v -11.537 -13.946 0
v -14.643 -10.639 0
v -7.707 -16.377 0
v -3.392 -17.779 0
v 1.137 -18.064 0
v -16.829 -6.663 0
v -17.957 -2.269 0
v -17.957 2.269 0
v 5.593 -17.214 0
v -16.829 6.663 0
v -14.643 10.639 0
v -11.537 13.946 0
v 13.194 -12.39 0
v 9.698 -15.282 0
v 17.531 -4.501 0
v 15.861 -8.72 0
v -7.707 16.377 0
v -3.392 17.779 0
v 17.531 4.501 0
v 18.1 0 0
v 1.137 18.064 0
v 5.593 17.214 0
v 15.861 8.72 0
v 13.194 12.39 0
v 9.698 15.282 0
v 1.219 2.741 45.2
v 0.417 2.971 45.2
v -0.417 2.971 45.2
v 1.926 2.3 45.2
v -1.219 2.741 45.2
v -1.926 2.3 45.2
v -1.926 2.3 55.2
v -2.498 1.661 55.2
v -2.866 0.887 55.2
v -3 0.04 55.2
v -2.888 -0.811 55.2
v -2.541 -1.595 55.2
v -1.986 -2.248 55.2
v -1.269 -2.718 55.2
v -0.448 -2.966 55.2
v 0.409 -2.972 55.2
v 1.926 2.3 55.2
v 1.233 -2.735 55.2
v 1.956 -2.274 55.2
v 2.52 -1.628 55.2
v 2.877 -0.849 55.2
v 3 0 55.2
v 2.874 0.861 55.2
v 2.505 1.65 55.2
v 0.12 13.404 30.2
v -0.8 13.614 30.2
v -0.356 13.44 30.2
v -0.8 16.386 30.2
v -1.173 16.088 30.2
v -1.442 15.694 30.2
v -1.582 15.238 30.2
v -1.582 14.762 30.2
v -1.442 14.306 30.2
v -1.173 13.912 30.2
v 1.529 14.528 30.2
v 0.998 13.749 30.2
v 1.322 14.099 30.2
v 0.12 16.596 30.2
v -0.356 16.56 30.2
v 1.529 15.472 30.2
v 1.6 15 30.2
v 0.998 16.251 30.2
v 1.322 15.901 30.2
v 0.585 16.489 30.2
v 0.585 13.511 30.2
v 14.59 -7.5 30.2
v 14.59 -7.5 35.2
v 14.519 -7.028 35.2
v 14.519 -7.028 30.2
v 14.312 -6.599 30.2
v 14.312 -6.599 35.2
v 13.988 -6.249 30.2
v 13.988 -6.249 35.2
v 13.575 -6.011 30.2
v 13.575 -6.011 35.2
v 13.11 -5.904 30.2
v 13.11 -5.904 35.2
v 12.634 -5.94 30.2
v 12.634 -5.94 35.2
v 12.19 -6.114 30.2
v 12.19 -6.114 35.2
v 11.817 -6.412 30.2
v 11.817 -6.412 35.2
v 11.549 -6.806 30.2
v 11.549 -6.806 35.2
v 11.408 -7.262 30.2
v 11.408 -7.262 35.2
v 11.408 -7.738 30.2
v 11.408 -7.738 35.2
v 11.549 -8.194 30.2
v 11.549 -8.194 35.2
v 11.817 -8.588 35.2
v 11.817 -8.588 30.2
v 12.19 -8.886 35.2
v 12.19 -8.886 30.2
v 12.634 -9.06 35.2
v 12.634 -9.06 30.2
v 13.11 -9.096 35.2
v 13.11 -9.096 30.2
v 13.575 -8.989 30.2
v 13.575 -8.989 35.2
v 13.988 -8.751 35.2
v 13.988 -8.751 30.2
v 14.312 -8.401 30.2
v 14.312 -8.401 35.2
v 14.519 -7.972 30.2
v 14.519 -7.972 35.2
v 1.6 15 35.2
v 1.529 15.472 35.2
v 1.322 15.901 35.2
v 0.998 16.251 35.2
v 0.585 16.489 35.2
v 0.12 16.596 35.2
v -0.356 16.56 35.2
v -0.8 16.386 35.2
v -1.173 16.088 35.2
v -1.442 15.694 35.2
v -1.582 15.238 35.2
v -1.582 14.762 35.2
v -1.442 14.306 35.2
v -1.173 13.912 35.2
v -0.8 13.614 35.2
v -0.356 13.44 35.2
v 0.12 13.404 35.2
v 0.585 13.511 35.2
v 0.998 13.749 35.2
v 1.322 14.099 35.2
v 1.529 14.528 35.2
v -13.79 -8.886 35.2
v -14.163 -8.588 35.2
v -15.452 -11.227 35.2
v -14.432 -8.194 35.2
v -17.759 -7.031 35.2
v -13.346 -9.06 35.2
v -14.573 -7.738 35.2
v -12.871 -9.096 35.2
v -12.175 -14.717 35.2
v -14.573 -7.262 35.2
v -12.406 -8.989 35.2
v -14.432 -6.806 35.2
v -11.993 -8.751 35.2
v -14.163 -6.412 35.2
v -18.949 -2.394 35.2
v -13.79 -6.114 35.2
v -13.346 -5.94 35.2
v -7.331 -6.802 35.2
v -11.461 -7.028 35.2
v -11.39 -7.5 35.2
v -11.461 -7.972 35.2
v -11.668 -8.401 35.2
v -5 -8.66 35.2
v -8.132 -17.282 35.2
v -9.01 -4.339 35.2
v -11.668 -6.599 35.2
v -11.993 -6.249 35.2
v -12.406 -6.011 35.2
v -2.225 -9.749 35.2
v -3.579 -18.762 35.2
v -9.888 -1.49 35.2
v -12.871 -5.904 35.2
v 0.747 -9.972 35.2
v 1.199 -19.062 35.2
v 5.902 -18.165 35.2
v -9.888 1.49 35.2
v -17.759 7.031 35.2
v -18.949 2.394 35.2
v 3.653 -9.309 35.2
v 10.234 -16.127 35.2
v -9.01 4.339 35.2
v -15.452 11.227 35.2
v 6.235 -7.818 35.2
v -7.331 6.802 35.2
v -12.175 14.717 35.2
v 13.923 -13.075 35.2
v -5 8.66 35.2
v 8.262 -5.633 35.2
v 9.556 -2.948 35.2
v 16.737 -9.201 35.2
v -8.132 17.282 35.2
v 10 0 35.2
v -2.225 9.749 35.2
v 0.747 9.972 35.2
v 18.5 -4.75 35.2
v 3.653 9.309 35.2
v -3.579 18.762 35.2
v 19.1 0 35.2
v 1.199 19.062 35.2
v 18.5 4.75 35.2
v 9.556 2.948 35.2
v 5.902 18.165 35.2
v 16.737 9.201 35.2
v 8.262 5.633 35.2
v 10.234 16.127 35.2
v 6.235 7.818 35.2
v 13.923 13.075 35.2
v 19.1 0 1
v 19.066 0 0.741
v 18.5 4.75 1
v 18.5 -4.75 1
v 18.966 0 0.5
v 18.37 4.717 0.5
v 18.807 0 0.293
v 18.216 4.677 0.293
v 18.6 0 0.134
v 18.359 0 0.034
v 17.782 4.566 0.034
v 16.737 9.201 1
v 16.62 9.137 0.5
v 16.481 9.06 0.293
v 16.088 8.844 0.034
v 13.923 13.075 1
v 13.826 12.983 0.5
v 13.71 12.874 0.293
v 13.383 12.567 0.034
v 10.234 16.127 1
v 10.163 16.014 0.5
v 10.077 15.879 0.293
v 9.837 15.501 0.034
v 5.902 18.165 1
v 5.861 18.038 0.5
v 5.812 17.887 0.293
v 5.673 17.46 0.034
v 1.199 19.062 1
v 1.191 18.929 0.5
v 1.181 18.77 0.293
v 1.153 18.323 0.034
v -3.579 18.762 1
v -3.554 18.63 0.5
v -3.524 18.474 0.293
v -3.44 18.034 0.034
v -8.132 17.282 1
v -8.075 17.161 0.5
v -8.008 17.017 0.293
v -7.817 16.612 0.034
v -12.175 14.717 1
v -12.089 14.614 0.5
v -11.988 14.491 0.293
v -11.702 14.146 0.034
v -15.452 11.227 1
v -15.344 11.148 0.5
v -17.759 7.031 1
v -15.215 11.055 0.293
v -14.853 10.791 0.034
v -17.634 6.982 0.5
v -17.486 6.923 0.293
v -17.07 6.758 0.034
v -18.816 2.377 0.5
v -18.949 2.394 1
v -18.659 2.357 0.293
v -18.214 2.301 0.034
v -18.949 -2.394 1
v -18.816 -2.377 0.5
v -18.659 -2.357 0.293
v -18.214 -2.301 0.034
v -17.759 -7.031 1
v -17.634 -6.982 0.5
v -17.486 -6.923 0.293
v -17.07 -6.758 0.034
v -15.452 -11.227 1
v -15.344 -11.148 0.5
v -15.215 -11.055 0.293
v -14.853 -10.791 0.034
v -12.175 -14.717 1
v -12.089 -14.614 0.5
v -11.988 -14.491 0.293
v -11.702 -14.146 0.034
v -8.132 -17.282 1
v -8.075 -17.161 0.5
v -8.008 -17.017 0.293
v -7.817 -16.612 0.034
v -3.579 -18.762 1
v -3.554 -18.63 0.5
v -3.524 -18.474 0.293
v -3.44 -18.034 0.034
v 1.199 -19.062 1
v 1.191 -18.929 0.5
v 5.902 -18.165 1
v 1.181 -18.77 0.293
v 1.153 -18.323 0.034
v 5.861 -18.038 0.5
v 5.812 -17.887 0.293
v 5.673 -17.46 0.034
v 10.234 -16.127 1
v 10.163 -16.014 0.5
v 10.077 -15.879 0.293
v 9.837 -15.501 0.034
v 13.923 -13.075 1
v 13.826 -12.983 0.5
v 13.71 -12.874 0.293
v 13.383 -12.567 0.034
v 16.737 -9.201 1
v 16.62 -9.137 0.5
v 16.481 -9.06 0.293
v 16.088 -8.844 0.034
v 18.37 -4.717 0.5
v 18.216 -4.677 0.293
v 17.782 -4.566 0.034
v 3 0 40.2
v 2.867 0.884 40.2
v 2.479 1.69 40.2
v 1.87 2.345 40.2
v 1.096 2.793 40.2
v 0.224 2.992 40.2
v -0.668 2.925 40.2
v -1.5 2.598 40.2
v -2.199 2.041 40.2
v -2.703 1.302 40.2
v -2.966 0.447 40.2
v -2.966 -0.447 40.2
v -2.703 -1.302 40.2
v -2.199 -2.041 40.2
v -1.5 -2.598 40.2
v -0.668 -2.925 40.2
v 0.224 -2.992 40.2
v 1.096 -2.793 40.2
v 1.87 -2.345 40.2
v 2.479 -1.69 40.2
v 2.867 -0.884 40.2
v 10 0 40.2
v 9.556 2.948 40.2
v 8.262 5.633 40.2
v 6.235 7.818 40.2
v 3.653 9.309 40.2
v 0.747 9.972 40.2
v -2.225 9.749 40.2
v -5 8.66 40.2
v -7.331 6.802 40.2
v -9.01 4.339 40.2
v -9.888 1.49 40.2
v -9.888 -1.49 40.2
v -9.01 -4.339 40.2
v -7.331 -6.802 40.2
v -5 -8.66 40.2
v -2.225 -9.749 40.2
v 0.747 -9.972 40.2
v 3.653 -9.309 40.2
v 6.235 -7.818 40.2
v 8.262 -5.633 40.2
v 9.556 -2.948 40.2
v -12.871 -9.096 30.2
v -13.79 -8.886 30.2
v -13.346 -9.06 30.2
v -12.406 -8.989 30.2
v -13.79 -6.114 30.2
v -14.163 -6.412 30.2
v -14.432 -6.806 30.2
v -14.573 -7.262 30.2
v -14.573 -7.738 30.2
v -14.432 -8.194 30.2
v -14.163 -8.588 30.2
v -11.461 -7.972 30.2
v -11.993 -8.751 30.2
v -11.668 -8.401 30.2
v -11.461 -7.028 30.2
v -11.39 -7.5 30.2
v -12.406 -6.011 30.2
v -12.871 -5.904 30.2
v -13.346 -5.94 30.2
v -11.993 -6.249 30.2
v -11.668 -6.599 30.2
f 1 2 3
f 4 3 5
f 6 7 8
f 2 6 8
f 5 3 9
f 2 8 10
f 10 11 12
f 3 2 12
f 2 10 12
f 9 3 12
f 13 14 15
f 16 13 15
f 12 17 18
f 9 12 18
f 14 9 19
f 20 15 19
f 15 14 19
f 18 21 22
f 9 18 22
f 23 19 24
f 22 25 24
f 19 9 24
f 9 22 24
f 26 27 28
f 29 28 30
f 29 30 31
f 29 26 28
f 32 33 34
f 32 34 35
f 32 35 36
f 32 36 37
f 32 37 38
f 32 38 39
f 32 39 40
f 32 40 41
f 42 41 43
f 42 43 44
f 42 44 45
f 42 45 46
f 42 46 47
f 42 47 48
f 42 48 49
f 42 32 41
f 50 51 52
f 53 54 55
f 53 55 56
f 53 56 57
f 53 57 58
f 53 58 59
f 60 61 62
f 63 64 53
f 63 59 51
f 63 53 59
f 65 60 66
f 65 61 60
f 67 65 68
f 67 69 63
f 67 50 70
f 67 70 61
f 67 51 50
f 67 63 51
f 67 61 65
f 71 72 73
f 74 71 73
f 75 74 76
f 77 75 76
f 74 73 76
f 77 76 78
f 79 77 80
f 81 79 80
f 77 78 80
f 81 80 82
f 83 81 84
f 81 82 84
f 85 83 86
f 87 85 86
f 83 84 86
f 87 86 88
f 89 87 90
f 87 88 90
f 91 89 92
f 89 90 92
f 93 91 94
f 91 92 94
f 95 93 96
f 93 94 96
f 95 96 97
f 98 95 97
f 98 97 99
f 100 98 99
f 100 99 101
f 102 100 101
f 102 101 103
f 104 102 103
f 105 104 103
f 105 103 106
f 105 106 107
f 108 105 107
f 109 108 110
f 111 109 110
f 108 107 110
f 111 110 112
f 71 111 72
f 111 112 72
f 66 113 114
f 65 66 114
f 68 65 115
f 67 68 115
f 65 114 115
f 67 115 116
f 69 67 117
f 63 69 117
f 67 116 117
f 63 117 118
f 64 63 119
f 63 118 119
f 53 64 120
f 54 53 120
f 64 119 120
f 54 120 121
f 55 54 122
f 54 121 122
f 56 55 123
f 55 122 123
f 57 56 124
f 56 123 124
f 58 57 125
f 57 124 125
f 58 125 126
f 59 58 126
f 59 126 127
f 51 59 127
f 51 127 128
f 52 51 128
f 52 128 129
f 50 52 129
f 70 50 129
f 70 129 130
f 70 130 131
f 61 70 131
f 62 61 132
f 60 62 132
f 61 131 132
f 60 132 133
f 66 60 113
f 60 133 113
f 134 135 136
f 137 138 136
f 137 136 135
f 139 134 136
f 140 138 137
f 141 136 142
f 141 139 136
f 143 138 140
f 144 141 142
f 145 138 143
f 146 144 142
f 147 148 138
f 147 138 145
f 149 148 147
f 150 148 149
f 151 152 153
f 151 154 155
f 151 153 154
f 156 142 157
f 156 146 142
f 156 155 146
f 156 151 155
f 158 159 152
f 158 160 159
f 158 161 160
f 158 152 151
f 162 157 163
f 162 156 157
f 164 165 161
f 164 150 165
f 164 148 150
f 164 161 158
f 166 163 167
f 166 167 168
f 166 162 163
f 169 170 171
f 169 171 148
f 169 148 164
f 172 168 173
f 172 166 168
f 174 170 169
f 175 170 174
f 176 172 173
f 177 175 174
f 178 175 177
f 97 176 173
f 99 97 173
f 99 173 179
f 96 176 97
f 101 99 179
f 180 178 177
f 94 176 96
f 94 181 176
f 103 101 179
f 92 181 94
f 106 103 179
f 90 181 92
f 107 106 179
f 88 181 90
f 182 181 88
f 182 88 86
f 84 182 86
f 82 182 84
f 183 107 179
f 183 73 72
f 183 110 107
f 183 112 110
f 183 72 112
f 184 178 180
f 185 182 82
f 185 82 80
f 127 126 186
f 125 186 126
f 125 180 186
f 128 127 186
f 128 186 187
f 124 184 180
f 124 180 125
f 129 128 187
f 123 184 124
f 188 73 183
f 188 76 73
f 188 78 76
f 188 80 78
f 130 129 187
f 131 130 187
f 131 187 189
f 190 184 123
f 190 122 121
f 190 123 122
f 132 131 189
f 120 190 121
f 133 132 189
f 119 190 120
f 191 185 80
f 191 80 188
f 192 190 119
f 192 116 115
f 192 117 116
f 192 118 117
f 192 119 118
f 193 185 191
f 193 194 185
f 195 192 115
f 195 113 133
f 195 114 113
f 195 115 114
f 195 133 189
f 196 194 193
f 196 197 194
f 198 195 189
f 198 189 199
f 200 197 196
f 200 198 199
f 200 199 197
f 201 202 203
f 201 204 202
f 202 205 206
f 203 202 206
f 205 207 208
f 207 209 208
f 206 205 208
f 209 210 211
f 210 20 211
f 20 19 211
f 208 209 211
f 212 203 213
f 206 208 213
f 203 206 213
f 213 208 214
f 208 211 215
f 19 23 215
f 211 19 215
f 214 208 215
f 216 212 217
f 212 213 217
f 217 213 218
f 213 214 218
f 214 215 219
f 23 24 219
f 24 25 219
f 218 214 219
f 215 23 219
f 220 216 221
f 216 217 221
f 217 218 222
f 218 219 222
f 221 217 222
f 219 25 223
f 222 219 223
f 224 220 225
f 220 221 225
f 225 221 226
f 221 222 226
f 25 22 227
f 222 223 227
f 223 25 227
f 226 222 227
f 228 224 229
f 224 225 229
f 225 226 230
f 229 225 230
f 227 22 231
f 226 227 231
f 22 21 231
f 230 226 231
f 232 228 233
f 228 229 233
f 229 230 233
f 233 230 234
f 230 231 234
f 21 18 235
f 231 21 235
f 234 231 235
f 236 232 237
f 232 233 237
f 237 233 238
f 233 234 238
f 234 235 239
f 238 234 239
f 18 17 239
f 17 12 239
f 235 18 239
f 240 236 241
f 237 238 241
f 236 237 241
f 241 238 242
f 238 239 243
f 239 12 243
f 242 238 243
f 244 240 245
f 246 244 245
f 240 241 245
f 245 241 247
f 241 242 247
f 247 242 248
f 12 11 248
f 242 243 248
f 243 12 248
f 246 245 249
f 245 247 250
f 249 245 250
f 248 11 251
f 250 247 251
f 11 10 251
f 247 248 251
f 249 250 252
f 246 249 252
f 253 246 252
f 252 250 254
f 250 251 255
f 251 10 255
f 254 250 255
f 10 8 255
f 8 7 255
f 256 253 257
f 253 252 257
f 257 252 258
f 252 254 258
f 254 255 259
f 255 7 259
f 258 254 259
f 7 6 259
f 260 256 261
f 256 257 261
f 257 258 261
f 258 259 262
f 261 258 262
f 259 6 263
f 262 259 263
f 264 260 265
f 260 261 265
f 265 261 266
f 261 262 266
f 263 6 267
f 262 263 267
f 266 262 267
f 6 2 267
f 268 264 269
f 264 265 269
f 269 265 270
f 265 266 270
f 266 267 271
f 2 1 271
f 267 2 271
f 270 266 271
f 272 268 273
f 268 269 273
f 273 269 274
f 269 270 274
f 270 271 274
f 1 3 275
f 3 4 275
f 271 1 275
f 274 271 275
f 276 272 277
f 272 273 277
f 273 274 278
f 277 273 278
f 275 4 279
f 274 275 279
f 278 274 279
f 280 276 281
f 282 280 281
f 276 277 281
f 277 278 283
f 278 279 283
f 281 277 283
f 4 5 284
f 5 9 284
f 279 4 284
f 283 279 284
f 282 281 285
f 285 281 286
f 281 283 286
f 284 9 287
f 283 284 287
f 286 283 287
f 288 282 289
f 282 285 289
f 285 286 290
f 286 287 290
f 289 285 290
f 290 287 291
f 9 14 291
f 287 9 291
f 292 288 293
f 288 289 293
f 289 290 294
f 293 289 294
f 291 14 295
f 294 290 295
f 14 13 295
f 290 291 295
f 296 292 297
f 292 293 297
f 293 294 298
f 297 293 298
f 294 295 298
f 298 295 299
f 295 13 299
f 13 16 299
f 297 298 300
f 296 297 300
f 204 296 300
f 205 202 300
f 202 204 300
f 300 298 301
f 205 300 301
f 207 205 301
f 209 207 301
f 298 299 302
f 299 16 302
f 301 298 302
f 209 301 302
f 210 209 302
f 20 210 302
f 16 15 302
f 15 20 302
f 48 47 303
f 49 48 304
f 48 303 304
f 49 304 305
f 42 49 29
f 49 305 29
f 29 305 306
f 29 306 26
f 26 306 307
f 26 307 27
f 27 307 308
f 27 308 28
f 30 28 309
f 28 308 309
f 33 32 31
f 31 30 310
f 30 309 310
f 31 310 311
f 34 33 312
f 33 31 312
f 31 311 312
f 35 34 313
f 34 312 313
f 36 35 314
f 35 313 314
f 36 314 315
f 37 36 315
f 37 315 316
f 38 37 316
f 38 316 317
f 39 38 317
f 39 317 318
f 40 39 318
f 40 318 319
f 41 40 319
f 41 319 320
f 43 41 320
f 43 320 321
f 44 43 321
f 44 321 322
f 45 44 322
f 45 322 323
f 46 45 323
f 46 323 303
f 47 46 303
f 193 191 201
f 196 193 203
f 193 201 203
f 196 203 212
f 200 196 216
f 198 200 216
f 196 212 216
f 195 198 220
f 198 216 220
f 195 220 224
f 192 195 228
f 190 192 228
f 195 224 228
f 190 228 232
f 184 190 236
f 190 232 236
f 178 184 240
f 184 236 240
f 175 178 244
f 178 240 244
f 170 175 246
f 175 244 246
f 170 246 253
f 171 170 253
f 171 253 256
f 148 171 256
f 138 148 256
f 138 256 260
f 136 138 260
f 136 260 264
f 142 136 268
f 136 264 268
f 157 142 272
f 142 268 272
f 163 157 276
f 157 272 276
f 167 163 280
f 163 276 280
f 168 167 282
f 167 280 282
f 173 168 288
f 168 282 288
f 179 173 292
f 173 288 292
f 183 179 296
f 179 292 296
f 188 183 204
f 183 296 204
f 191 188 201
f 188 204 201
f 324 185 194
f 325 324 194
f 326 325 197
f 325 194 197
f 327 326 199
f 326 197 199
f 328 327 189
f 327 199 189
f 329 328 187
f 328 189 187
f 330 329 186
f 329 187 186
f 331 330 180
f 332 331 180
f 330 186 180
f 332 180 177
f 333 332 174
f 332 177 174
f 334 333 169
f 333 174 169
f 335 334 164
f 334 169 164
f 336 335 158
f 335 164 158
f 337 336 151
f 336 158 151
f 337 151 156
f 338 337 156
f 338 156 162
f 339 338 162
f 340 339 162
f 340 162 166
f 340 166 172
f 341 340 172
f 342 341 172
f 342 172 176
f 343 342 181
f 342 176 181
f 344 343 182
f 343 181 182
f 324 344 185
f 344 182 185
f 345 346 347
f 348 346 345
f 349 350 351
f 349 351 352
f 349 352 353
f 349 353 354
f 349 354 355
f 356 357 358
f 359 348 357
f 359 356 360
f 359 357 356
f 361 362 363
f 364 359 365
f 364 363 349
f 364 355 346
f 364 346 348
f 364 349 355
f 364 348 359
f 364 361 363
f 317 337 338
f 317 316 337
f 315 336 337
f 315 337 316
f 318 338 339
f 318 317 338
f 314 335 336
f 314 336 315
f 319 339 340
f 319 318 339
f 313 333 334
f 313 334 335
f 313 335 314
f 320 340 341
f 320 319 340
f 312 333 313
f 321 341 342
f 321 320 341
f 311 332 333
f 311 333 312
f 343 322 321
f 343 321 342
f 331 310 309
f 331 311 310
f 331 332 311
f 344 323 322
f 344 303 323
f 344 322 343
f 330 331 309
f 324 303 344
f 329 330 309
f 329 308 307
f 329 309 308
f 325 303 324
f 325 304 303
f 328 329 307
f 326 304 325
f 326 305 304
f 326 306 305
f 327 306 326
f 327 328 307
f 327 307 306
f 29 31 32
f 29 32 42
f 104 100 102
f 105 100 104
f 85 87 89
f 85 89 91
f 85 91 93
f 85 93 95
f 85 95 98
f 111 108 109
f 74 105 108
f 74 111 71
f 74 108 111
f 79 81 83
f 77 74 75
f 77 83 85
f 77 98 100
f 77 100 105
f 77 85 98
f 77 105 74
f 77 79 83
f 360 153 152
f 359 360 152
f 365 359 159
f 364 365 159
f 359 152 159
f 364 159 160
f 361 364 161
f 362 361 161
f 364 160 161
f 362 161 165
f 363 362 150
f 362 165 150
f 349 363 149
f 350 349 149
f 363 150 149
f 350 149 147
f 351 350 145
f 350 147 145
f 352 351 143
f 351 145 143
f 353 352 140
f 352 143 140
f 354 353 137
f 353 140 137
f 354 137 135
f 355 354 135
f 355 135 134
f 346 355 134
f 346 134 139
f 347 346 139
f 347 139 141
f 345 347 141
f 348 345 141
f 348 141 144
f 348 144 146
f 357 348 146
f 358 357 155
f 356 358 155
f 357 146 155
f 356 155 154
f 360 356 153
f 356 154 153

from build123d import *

# Parameters (mm, degrees)
SKETCH_1_R          = 19.1
EXTRUDE_1_DEPTH     = 35.2
SKETCH_2_R          = 10
EXTRUDE_2_DEPTH     = 5
SKETCH_4_R          = 1.6
CUT_EXTRUDE_1_DEPTH = 5
SKETCH_5_R          = 3
EXTRUDE_3_DEPTH     = 15
CUT_EXTRUDE_START   = -10
CUT_EXTRUDE_2_DEPTH = 10
FILLET_1_R          = 1


with BuildPart() as part:
    # 草图1 → 凸台-拉伸1 (new body)
    with BuildSketch(Plane.XY):
        Circle(SKETCH_1_R)
    extrude(amount=EXTRUDE_1_DEPTH)

    # 草图2 → 凸台-拉伸2 (add)
    with BuildSketch(Plane.XY.offset(35.2)):
        Circle(SKETCH_2_R)
    extrude(amount=EXTRUDE_2_DEPTH)

    # 草图4 → 切除-拉伸1 (cut)
    with BuildSketch(Plane.XY.offset(35.2)):
        with Locations((0, 15)):
            Circle(SKETCH_4_R)
        with Locations((12.990381057, -7.5)):
            Circle(SKETCH_4_R)
        with Locations((-12.990381057, -7.5)):
            Circle(SKETCH_4_R)
    extrude(amount=-CUT_EXTRUDE_1_DEPTH, mode=Mode.SUBTRACT)

    # 草图5 → 凸台-拉伸3 (add)
    with BuildSketch(Plane.XY.offset(40.2)):
        Circle(SKETCH_5_R)
    extrude(amount=EXTRUDE_3_DEPTH)

    # 草图6 → 切除-拉伸2 (cut)
    with BuildSketch(Plane.XY.offset(55.2).offset(CUT_EXTRUDE_START)):
        with BuildLine():
            Line((-1.926136028, 2.3), (1.926136028, 2.3))
            ThreePointArc((1.926136028, 2.3), (0, 3), (-1.926136028, 2.3))
        make_face()
    extrude(amount=CUT_EXTRUDE_2_DEPTH, mode=Mode.SUBTRACT)

    # 圆角1
    fillet_1_edges = [part.edges().sort_by_distance(p)[0] for p in [
        (-19.1, 0, 0),
    ]]
    fillet(fillet_1_edges, radius=FILLET_1_R)


solid = part.part
